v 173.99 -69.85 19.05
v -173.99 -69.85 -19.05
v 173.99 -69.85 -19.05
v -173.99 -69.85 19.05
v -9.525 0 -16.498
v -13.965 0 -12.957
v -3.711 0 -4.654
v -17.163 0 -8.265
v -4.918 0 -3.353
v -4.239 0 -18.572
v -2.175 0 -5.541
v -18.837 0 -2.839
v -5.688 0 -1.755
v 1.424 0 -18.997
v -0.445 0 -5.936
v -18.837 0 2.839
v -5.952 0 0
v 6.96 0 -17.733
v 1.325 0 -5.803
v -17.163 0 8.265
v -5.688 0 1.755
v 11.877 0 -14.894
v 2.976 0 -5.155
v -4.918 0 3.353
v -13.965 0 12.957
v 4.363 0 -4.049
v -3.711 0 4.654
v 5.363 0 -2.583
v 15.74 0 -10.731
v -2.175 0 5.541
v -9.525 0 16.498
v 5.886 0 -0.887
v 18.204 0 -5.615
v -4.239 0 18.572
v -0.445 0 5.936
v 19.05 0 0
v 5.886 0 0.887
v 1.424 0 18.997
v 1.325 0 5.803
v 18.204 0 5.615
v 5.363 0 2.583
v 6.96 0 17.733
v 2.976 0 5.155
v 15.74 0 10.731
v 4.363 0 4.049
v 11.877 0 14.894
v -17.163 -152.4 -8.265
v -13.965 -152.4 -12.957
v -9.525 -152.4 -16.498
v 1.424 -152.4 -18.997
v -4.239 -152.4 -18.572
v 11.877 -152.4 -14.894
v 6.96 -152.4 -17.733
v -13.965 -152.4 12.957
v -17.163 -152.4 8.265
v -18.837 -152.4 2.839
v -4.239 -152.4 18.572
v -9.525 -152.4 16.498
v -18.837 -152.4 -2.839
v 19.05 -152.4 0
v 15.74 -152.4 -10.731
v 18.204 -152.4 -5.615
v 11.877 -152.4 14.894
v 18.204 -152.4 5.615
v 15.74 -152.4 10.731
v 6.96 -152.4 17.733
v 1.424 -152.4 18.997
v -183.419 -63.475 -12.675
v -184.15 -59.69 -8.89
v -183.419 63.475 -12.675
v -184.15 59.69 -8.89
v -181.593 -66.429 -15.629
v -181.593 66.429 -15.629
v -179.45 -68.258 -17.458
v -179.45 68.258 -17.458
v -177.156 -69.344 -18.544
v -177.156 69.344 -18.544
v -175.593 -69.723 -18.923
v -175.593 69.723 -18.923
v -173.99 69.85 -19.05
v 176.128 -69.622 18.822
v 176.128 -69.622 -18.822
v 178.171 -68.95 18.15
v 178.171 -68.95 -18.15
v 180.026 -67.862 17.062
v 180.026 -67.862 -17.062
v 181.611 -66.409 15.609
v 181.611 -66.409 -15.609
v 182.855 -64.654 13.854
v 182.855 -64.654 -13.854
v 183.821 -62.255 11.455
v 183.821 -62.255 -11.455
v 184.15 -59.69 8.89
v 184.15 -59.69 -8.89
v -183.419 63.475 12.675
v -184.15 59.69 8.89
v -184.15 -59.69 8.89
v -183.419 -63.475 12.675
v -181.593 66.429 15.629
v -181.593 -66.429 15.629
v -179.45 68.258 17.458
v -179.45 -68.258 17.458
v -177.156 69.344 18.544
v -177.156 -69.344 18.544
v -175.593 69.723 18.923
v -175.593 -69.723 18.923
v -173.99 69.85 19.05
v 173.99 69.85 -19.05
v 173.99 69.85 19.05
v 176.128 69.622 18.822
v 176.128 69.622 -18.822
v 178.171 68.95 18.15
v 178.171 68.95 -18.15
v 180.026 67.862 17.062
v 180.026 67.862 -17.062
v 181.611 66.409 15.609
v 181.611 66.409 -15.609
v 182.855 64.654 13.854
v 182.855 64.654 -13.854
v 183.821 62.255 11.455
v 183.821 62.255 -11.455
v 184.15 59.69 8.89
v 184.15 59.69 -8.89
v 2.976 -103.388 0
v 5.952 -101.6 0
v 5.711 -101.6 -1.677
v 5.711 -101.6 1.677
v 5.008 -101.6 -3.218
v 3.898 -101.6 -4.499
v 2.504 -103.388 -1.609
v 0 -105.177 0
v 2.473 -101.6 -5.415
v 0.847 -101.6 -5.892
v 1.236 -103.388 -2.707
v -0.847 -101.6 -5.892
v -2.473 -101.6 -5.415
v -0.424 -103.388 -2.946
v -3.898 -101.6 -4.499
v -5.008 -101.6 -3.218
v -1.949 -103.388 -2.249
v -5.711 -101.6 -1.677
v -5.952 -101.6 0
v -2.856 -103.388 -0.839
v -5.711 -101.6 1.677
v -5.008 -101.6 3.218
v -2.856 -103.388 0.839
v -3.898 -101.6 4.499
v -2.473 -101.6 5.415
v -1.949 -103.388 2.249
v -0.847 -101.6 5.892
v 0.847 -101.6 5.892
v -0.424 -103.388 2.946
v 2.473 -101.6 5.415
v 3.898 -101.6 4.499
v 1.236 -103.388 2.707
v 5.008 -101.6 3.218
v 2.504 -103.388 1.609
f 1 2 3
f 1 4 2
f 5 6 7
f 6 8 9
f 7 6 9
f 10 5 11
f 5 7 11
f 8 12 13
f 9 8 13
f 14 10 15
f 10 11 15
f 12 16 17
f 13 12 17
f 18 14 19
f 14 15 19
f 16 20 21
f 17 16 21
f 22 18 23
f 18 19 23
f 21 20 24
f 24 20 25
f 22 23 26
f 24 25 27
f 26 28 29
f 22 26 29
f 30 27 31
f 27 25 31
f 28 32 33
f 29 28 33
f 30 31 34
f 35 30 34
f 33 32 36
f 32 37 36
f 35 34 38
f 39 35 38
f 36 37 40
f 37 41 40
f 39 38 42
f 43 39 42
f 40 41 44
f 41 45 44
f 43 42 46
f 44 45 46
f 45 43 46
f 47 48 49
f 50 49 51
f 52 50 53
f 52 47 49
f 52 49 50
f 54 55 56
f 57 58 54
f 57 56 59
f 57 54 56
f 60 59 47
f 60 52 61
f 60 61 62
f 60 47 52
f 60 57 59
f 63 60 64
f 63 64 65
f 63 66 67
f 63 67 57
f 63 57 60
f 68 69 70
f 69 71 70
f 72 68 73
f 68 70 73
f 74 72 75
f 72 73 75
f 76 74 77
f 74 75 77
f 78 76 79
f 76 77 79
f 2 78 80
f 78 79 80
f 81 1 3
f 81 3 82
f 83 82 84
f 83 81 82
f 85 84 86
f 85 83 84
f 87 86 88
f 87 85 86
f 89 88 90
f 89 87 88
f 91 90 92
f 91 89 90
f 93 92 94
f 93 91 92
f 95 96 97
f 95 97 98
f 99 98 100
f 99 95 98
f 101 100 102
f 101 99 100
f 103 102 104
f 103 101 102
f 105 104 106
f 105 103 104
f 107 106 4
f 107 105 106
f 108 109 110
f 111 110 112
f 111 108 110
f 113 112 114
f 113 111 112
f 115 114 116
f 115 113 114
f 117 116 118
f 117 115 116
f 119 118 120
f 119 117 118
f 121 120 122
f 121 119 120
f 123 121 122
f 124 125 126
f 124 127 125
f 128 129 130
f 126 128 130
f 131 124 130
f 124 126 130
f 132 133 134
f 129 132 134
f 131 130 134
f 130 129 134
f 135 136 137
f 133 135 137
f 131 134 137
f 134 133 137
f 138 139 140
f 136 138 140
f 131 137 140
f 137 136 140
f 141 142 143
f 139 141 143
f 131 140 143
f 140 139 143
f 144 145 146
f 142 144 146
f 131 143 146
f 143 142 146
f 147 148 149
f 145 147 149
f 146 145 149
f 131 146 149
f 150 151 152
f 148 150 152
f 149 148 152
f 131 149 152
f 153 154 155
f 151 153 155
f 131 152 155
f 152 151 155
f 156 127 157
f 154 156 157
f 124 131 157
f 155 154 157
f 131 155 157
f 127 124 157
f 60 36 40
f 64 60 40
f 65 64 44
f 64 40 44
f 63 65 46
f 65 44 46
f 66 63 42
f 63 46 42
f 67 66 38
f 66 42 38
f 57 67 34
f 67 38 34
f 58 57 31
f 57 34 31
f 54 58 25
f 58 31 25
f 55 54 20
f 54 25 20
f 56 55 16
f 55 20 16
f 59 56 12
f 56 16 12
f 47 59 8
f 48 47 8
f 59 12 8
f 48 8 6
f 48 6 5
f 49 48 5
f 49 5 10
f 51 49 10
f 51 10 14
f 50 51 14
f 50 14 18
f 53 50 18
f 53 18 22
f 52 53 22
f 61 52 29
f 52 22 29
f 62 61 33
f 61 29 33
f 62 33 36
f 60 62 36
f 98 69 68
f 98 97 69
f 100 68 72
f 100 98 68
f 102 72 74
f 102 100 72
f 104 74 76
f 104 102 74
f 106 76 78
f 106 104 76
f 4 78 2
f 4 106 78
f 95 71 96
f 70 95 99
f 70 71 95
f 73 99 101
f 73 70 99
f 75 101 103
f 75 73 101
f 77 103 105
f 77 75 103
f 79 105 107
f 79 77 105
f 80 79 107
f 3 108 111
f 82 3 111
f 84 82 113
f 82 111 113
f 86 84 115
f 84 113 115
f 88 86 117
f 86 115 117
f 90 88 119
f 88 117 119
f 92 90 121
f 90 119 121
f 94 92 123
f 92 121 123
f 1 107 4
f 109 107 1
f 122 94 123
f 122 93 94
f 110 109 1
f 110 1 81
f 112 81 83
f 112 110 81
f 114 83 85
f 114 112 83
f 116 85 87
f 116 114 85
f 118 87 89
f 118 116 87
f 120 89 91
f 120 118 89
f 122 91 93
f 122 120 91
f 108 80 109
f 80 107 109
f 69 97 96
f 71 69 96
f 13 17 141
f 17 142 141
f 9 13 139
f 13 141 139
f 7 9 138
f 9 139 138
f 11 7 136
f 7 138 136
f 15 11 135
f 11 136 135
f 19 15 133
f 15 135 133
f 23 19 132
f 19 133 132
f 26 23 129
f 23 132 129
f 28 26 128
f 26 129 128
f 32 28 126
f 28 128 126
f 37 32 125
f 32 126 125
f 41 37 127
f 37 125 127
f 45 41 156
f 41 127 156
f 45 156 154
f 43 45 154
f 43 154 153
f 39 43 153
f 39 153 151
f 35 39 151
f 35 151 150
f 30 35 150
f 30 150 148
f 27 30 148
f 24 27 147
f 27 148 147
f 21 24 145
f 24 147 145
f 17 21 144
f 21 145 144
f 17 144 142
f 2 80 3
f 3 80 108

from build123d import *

# Parameters (mm, degrees)
F0_R     = 19.05
F1_DEPTH = 152.4
F2_D     = 11.90498
F2_DEPTH = 101.6
F2_TIP   = 3.5766168262
F3_W     = 368.3
F3_H     = 139.7
F4_DEPTH = 19.05
F5_R     = 10.16
F6_R     = 10.16


with BuildPart() as f1:
    # F0 (on Front) → F1 (new body)
    with BuildSketch(Plane.XZ):
        Circle(F0_R)
    extrude(amount=F1_DEPTH)

    # F2
    with Locations(Plane(origin=(0, 0, 0), x_dir=(1, 0, 0), z_dir=(0, 1, 0))):
        with Locations((0, 0)):
            Hole(F2_D / 2, depth=F2_DEPTH)
            with Locations((0, 0, -(F2_DEPTH + F2_TIP / 2))):  # 118° drill point
                Cone(0, F2_D / 2, F2_TIP, mode=Mode.SUBTRACT)


with BuildPart() as f4:
    # F3 (on Top) → F4 (new body, symmetric)
    with BuildSketch(Plane.XY):
        Rectangle(F3_W, F3_H)
    extrude(amount=F4_DEPTH, both=True)

    # F5
    f5_edges = [f4.edges().sort_by_distance(p)[0] for p in [
        (-184.15, 69.85, 0),
        (-184.15, 0, -19.05),
        (-184.15, -69.85, 0),
        (-184.15, 0, 19.05),
    ]]
    fillet(f5_edges, radius=F5_R)

    # F6
    f6_edges = [f4.edges().sort_by_distance(p)[0] for p in [
        (184.15, 0, -19.05),
        (184.15, 69.85, 0),
        (184.15, 0, 19.05),
        (184.15, -69.85, 0),
    ]]
    fillet(f6_edges, radius=F6_R)


solid = Compound([f1.part, f4.part])
